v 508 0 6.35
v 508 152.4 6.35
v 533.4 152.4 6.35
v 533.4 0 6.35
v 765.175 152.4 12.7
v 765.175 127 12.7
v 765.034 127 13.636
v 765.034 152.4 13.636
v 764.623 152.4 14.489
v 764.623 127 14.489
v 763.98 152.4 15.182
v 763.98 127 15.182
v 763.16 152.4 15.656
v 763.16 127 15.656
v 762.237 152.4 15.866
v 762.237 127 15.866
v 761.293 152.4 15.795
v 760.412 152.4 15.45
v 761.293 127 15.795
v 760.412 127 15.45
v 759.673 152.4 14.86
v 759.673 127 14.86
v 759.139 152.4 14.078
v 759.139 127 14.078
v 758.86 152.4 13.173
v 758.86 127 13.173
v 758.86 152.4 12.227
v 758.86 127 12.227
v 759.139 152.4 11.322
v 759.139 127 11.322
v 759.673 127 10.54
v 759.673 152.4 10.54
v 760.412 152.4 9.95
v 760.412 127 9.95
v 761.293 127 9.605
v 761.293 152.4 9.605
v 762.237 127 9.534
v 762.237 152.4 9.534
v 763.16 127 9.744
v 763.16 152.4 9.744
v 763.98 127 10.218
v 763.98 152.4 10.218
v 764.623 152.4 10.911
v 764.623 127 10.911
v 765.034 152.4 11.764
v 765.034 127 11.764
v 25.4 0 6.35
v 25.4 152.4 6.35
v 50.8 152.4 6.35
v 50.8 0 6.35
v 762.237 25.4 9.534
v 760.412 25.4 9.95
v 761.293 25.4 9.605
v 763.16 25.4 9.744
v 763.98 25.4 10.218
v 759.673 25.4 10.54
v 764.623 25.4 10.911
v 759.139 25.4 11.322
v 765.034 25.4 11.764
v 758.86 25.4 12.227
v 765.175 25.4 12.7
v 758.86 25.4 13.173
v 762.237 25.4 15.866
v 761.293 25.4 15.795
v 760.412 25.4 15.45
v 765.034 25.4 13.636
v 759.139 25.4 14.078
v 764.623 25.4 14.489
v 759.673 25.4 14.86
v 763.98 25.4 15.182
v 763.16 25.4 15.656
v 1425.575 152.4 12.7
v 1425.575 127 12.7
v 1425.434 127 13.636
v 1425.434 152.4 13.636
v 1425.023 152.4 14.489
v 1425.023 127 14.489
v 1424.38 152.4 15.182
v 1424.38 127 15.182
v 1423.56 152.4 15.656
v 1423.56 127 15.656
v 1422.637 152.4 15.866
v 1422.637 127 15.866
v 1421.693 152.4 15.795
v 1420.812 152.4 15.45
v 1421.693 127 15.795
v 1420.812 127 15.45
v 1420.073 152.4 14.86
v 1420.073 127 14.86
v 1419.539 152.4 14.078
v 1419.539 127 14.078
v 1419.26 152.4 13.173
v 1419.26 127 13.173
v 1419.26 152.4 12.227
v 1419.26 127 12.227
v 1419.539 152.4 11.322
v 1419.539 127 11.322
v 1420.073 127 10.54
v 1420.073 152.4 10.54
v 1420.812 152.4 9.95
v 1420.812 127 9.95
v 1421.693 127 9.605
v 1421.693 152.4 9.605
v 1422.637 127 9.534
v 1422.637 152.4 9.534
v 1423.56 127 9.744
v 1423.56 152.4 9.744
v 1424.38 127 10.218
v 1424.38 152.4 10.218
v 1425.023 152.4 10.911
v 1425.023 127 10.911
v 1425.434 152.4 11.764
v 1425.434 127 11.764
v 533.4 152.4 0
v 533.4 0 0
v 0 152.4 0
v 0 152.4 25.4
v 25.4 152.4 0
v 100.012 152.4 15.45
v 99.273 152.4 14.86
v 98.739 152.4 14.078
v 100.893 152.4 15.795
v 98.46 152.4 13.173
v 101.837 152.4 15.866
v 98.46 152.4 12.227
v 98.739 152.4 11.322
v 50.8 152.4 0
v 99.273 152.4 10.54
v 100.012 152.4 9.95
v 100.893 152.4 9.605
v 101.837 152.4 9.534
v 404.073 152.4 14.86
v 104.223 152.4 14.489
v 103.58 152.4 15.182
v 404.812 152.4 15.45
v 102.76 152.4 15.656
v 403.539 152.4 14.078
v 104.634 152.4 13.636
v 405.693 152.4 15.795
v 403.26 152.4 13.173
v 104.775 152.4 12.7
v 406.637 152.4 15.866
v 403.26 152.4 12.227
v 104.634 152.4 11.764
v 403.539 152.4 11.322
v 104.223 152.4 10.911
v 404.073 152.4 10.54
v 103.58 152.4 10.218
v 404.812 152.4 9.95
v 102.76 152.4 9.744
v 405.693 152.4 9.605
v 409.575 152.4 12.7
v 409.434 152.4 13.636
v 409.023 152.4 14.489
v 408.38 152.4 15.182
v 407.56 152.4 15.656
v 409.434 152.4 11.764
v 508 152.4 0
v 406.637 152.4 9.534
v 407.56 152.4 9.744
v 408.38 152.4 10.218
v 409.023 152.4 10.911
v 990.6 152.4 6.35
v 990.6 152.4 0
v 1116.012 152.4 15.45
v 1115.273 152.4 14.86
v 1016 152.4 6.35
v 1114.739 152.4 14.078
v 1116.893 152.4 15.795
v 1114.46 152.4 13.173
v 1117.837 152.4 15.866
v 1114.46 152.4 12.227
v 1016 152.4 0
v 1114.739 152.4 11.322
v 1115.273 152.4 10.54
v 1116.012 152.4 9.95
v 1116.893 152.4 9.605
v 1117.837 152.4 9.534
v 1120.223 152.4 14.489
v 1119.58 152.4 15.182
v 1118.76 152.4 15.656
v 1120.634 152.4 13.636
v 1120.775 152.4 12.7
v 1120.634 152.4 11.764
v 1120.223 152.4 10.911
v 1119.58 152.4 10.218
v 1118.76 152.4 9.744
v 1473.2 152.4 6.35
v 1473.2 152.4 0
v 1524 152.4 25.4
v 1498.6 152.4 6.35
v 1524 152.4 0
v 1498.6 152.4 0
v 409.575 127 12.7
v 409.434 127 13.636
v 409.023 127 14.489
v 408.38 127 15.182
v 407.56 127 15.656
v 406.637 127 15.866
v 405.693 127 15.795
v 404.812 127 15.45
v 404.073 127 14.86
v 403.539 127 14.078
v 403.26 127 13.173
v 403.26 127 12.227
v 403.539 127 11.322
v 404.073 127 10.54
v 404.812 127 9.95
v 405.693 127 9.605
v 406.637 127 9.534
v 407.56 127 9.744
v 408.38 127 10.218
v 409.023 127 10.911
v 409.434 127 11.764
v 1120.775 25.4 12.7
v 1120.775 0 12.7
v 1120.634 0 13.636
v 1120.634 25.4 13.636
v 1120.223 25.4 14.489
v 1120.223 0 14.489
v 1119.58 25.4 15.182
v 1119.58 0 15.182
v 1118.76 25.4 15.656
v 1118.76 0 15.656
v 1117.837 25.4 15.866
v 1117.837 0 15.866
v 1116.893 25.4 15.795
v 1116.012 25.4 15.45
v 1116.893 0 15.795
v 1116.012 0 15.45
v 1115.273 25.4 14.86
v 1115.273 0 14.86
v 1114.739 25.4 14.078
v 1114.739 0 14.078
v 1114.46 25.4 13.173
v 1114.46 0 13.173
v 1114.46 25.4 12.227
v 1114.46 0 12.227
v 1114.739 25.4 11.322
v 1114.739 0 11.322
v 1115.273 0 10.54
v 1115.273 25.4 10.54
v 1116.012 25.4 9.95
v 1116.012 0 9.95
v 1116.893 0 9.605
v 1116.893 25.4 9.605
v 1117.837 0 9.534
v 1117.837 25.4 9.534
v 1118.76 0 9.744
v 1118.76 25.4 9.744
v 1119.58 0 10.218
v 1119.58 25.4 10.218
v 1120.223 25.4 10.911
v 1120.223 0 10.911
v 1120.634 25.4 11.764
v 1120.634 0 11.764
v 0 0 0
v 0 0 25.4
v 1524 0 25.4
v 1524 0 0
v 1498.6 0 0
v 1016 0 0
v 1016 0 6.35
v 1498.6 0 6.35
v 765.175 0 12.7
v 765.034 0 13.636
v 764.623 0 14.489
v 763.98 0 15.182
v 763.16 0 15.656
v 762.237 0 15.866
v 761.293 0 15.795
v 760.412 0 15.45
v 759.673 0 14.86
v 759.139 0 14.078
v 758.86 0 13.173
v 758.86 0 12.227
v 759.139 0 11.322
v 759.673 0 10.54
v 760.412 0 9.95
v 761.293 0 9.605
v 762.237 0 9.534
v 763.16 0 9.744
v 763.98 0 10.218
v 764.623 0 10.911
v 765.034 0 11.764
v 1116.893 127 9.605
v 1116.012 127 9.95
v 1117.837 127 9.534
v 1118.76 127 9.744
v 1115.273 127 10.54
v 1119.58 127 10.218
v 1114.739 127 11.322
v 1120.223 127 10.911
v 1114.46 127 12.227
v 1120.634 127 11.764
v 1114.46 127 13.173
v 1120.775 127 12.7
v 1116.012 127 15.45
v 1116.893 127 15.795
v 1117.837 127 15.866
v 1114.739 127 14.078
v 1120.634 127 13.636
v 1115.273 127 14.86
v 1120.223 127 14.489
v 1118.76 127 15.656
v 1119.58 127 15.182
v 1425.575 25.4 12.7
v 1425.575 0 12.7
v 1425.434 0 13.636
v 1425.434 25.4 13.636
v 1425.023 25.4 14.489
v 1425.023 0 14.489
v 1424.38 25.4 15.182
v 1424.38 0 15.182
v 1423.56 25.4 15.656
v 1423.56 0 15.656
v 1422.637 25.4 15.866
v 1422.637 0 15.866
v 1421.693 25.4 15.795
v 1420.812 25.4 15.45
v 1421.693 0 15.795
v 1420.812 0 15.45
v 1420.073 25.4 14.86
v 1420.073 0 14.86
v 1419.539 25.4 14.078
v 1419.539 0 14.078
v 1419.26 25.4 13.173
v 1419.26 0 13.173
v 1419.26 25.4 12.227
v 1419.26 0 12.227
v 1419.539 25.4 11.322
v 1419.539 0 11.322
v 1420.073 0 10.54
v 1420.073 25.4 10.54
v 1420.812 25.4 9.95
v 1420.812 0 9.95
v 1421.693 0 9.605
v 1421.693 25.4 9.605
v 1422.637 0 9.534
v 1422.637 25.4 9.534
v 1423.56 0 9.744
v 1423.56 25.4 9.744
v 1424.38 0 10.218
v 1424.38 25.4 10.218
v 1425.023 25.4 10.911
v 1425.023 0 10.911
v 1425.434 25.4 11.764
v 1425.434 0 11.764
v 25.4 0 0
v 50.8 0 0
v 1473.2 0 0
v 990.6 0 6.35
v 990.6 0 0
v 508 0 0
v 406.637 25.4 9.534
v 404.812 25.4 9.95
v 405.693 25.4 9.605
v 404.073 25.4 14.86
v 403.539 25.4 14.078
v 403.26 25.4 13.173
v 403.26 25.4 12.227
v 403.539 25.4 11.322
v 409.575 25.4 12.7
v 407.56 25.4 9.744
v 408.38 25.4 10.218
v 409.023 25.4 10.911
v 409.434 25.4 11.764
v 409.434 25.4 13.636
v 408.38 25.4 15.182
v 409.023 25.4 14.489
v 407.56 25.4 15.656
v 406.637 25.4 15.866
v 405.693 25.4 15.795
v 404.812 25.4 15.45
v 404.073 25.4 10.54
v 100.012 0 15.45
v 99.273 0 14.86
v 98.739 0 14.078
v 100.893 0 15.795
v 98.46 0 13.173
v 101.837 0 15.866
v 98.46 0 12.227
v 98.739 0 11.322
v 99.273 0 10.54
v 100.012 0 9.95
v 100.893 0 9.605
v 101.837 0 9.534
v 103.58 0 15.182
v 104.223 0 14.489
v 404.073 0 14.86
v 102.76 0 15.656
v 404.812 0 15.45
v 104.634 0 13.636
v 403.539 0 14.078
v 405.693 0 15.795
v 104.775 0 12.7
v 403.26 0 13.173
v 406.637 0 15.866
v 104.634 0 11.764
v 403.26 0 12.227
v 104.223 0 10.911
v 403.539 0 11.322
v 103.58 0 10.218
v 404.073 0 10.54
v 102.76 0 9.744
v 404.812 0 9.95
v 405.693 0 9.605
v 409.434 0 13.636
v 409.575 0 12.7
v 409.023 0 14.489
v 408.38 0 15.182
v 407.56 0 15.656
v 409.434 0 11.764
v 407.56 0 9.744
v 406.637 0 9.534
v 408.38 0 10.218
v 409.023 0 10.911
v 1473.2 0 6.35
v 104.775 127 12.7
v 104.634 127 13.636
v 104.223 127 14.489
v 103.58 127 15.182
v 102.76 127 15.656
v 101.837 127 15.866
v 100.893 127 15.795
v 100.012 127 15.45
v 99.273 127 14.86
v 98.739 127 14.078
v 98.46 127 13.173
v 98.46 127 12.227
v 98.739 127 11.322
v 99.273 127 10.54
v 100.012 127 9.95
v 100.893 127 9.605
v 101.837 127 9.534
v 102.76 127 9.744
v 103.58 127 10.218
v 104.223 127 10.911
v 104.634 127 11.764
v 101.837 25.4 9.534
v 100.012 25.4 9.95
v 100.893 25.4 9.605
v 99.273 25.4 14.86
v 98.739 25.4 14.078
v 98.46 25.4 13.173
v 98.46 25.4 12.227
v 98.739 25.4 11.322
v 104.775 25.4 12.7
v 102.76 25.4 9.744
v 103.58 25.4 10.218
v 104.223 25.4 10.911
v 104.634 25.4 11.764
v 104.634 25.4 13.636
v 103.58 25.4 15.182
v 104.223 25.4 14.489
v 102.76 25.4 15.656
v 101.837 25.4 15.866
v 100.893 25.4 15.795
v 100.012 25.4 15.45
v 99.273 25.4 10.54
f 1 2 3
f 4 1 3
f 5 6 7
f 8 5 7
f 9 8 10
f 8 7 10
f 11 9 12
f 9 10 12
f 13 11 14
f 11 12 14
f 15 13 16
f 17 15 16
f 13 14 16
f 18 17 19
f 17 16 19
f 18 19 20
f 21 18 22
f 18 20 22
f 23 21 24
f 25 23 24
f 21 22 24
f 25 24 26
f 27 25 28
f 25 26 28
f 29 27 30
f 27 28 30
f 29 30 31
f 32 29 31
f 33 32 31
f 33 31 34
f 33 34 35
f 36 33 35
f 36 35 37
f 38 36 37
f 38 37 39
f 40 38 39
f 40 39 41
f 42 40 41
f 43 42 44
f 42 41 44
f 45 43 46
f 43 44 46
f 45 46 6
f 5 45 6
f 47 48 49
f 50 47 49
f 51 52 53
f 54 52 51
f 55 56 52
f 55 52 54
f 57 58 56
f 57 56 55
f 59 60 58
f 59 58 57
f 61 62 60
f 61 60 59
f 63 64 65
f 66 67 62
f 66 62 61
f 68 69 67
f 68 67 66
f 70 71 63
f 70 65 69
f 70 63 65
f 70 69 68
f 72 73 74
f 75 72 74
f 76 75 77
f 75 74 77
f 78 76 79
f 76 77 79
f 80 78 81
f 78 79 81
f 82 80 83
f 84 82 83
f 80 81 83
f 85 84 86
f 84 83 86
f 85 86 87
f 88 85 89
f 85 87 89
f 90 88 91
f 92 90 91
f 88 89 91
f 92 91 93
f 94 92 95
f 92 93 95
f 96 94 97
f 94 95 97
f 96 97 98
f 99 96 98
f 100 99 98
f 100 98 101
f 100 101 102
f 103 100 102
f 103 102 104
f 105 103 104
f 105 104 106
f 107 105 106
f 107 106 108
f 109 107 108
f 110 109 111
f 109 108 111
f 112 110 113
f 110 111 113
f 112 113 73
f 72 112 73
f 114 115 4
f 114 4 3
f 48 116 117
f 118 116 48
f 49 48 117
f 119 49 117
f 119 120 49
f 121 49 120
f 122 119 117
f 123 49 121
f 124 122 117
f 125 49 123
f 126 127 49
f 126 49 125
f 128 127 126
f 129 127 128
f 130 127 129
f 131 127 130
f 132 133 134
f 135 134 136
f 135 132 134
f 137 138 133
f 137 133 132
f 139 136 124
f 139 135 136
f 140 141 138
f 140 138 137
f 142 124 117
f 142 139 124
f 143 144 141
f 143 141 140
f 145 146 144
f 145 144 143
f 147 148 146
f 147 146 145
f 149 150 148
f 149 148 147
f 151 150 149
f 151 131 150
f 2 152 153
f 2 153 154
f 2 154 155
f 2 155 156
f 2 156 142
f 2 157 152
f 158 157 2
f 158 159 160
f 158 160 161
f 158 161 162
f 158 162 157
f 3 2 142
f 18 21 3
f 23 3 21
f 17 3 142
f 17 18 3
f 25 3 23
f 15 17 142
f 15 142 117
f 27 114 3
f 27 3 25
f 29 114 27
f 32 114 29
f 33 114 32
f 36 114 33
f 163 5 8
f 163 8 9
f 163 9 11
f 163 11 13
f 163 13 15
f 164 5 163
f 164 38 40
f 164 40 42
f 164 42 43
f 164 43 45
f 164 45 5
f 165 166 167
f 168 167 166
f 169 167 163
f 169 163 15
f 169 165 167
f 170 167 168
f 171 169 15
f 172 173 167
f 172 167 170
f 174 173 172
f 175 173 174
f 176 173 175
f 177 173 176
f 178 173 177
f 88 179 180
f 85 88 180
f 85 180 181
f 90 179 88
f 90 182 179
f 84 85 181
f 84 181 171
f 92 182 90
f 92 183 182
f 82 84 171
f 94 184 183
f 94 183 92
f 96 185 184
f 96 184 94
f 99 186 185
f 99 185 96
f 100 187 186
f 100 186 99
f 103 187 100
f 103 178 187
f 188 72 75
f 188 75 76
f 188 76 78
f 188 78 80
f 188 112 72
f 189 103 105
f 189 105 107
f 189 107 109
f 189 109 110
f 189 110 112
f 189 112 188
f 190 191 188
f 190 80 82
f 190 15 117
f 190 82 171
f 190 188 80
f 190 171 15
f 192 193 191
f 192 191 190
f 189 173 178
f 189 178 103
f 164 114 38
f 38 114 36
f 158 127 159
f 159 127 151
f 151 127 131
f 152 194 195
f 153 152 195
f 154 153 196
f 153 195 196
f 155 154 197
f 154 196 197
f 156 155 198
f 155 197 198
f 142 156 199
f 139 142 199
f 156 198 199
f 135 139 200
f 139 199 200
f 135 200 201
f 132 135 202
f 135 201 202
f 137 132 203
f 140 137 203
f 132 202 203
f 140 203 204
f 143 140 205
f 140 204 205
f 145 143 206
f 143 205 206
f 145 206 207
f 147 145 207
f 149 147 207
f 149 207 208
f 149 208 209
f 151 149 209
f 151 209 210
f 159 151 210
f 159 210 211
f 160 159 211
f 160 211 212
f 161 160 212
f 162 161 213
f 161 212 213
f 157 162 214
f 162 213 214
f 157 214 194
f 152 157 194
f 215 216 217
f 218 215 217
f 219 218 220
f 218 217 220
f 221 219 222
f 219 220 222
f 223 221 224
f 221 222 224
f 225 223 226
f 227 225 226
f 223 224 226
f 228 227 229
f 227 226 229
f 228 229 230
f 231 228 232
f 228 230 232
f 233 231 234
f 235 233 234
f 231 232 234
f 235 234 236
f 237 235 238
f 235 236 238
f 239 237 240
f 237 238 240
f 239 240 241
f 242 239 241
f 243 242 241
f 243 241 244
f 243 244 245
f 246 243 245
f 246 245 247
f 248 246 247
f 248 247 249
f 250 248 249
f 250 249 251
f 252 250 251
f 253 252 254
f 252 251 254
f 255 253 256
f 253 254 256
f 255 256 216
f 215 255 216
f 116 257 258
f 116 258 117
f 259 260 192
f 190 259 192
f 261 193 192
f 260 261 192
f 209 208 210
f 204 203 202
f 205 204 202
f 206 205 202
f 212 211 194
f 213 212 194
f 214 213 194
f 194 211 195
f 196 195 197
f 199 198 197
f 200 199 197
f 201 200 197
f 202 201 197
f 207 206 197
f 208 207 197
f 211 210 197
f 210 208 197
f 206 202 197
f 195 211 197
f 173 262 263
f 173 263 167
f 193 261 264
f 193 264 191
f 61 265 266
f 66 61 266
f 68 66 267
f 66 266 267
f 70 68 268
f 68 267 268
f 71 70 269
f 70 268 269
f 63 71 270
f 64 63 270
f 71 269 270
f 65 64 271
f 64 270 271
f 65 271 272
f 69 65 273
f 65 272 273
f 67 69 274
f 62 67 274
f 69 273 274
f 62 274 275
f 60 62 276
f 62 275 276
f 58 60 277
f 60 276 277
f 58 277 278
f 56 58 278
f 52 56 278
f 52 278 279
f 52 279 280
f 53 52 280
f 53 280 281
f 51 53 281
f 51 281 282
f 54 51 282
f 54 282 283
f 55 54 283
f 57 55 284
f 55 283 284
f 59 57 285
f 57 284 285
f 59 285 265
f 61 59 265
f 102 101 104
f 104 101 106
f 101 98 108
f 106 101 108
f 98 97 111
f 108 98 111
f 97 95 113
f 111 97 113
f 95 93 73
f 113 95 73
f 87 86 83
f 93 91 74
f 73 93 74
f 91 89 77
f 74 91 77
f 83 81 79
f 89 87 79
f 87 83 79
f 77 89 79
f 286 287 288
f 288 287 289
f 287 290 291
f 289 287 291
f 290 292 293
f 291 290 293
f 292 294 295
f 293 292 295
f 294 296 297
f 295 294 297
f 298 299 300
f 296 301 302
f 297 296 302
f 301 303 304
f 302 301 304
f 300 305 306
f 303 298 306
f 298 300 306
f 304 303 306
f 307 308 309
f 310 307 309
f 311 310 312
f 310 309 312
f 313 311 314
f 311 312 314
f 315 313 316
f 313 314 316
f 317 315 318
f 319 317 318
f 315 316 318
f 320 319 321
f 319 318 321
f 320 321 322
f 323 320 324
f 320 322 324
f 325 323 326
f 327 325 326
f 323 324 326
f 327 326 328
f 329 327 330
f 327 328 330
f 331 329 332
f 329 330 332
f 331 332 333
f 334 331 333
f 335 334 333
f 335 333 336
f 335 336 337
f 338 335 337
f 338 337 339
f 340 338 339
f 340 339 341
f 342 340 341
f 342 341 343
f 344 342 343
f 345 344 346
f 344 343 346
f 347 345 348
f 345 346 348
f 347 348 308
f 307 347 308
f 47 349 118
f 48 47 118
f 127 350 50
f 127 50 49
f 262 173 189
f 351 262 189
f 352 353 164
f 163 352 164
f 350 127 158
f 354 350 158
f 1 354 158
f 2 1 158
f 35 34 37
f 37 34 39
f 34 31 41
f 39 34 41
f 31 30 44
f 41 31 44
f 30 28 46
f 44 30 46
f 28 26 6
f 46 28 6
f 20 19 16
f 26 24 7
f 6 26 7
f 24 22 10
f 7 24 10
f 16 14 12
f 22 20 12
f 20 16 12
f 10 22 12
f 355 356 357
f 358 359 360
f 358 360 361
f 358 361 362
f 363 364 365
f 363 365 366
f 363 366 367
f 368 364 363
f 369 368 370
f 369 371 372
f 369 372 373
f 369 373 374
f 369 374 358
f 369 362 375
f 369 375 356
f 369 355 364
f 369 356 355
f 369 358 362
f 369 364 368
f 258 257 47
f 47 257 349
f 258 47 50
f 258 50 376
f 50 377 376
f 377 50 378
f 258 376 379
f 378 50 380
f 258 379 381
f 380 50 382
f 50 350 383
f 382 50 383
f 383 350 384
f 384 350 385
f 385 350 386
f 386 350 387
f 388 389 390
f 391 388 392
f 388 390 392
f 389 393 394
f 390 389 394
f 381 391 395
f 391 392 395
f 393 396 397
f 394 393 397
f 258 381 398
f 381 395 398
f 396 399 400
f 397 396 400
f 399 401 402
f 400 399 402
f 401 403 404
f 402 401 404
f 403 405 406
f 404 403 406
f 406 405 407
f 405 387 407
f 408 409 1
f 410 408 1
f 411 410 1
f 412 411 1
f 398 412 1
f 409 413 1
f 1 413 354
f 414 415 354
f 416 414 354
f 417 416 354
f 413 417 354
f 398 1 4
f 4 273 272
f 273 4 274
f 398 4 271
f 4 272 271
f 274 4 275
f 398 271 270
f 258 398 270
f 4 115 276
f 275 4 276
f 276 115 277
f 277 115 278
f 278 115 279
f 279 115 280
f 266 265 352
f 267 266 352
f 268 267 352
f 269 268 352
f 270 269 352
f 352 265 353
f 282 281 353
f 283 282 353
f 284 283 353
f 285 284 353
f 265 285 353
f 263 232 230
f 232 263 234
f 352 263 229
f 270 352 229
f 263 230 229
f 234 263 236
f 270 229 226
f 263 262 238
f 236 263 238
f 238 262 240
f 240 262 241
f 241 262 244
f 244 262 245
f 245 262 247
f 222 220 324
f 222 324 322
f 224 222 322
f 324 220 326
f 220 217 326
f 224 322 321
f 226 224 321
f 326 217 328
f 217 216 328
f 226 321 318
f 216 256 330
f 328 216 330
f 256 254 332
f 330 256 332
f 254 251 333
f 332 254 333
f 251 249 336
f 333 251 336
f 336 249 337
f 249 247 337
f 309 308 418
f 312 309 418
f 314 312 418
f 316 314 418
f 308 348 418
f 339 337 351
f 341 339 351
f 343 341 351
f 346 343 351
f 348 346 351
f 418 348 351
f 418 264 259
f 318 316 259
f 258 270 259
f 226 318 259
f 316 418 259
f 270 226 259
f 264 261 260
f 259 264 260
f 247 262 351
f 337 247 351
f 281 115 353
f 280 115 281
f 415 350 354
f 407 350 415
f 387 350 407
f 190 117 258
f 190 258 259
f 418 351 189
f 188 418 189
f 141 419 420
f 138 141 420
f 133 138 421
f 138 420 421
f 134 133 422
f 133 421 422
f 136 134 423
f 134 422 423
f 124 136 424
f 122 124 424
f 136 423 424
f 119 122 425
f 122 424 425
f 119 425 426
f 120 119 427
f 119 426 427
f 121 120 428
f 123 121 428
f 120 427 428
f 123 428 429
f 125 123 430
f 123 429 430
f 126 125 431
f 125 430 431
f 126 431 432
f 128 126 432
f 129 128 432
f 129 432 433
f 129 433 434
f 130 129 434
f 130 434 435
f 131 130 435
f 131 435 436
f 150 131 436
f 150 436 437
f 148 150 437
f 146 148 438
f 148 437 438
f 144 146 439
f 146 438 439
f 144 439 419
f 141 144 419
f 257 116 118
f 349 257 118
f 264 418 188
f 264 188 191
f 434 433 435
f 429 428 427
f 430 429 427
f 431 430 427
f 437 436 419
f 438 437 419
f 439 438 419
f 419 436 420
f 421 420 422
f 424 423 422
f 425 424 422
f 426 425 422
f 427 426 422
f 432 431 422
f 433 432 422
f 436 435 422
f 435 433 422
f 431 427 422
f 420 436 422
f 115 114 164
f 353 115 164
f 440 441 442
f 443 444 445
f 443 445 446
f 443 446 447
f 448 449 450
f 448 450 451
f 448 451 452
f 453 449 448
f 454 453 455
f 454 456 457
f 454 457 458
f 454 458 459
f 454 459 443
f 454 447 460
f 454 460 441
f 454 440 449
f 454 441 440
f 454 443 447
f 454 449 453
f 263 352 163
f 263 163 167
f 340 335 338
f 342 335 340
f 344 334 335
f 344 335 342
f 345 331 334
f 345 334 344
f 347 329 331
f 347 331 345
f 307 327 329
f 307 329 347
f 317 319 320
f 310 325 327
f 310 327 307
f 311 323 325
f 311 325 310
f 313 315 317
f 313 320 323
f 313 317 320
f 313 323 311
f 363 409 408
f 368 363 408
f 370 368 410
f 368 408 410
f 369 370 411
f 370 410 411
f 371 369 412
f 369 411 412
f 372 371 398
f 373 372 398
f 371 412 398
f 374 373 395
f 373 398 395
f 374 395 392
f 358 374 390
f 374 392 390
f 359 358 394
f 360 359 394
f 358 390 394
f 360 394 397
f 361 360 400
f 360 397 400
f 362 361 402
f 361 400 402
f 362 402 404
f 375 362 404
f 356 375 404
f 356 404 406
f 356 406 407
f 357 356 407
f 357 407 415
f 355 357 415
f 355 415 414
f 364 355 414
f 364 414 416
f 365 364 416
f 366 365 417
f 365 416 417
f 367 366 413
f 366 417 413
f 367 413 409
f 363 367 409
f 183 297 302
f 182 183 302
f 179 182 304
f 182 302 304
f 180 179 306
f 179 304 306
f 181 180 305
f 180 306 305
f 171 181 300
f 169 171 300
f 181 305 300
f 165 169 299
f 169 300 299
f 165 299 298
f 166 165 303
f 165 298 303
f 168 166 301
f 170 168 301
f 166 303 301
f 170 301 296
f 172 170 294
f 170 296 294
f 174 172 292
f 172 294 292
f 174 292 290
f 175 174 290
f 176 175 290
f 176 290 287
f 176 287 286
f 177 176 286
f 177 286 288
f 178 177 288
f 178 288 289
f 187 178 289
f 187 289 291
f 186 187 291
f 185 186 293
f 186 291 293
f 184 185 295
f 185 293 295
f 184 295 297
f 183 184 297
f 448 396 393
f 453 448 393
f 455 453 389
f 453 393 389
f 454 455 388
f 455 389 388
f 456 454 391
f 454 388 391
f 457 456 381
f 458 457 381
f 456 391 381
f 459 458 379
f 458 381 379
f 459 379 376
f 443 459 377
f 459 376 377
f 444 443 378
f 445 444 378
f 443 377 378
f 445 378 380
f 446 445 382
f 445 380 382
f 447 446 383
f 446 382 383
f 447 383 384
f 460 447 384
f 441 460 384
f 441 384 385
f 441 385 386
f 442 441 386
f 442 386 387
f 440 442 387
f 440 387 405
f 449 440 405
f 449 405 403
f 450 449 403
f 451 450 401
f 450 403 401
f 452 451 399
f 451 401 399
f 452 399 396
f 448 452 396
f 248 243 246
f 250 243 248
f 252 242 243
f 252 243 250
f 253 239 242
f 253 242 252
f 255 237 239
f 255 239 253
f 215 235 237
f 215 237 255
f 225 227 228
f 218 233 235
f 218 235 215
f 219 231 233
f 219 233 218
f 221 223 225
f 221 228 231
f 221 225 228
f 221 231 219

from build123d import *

# Parameters (mm, degrees)
F0_W     = 1524
F0_H     = 152.4
F1_DEPTH = 25.4
F2_W     = 25.4
F2_H     = 215.9000692942
F3_DEPTH = 6.35
F4_R     = 3.175
F5_DEPTH = 25.4
F6_START = -127
F6_DEPTH = 25.4


with BuildPart() as f1:
    # F0 (on Top) → F1 (new body)
    with BuildSketch(Plane.XY):
        with Locations((762, 76.2)):
            Rectangle(F0_W, F0_H)
    extrude(amount=F1_DEPTH)

    # F2 (on Top) → F3 (cut)
    with BuildSketch(Plane.XY):
        with Locations((38.1, 77.0159456879)):
            Rectangle(F2_W, F2_H)
        with Locations((520.7, 77.0159456879)):
            Rectangle(F2_W, F2_H)
        with Locations((1003.3, 77.0159456879)):
            Rectangle(F2_W, F2_H)
        with Locations((1485.9, 77.0159456879)):
            Rectangle(F2_W, F2_H)
    extrude(amount=F3_DEPTH, mode=Mode.SUBTRACT)

    # F4 (on Front) → F5 (cut)
    with BuildSketch(Plane.XZ):
        with Locations((101.6, 12.7)):
            Circle(F4_R)
        with Locations((406.4, 12.7)):
            Circle(F4_R)
        with Locations((762, 12.7)):
            Circle(F4_R)
        with Locations((1117.6, 12.7)):
            Circle(F4_R)
        with Locations((1422.4, 12.7)):
            Circle(F4_R)
    extrude(amount=-F5_DEPTH, mode=Mode.SUBTRACT)

    # F4 (on Front) → F6 (cut)
    with BuildSketch(Plane.XZ.offset(F6_START)):
        with Locations((762, 12.7)):
            Circle(F4_R)
        with Locations((1117.6, 12.7)):
            Circle(F4_R)
        with Locations((1422.4, 12.7)):
            Circle(F4_R)
        with Locations((406.4, 12.7)):
            Circle(F4_R)
        with Locations((101.6, 12.7)):
            Circle(F4_R)
    extrude(amount=-F6_DEPTH, mode=Mode.SUBTRACT)


solid = f1.part
